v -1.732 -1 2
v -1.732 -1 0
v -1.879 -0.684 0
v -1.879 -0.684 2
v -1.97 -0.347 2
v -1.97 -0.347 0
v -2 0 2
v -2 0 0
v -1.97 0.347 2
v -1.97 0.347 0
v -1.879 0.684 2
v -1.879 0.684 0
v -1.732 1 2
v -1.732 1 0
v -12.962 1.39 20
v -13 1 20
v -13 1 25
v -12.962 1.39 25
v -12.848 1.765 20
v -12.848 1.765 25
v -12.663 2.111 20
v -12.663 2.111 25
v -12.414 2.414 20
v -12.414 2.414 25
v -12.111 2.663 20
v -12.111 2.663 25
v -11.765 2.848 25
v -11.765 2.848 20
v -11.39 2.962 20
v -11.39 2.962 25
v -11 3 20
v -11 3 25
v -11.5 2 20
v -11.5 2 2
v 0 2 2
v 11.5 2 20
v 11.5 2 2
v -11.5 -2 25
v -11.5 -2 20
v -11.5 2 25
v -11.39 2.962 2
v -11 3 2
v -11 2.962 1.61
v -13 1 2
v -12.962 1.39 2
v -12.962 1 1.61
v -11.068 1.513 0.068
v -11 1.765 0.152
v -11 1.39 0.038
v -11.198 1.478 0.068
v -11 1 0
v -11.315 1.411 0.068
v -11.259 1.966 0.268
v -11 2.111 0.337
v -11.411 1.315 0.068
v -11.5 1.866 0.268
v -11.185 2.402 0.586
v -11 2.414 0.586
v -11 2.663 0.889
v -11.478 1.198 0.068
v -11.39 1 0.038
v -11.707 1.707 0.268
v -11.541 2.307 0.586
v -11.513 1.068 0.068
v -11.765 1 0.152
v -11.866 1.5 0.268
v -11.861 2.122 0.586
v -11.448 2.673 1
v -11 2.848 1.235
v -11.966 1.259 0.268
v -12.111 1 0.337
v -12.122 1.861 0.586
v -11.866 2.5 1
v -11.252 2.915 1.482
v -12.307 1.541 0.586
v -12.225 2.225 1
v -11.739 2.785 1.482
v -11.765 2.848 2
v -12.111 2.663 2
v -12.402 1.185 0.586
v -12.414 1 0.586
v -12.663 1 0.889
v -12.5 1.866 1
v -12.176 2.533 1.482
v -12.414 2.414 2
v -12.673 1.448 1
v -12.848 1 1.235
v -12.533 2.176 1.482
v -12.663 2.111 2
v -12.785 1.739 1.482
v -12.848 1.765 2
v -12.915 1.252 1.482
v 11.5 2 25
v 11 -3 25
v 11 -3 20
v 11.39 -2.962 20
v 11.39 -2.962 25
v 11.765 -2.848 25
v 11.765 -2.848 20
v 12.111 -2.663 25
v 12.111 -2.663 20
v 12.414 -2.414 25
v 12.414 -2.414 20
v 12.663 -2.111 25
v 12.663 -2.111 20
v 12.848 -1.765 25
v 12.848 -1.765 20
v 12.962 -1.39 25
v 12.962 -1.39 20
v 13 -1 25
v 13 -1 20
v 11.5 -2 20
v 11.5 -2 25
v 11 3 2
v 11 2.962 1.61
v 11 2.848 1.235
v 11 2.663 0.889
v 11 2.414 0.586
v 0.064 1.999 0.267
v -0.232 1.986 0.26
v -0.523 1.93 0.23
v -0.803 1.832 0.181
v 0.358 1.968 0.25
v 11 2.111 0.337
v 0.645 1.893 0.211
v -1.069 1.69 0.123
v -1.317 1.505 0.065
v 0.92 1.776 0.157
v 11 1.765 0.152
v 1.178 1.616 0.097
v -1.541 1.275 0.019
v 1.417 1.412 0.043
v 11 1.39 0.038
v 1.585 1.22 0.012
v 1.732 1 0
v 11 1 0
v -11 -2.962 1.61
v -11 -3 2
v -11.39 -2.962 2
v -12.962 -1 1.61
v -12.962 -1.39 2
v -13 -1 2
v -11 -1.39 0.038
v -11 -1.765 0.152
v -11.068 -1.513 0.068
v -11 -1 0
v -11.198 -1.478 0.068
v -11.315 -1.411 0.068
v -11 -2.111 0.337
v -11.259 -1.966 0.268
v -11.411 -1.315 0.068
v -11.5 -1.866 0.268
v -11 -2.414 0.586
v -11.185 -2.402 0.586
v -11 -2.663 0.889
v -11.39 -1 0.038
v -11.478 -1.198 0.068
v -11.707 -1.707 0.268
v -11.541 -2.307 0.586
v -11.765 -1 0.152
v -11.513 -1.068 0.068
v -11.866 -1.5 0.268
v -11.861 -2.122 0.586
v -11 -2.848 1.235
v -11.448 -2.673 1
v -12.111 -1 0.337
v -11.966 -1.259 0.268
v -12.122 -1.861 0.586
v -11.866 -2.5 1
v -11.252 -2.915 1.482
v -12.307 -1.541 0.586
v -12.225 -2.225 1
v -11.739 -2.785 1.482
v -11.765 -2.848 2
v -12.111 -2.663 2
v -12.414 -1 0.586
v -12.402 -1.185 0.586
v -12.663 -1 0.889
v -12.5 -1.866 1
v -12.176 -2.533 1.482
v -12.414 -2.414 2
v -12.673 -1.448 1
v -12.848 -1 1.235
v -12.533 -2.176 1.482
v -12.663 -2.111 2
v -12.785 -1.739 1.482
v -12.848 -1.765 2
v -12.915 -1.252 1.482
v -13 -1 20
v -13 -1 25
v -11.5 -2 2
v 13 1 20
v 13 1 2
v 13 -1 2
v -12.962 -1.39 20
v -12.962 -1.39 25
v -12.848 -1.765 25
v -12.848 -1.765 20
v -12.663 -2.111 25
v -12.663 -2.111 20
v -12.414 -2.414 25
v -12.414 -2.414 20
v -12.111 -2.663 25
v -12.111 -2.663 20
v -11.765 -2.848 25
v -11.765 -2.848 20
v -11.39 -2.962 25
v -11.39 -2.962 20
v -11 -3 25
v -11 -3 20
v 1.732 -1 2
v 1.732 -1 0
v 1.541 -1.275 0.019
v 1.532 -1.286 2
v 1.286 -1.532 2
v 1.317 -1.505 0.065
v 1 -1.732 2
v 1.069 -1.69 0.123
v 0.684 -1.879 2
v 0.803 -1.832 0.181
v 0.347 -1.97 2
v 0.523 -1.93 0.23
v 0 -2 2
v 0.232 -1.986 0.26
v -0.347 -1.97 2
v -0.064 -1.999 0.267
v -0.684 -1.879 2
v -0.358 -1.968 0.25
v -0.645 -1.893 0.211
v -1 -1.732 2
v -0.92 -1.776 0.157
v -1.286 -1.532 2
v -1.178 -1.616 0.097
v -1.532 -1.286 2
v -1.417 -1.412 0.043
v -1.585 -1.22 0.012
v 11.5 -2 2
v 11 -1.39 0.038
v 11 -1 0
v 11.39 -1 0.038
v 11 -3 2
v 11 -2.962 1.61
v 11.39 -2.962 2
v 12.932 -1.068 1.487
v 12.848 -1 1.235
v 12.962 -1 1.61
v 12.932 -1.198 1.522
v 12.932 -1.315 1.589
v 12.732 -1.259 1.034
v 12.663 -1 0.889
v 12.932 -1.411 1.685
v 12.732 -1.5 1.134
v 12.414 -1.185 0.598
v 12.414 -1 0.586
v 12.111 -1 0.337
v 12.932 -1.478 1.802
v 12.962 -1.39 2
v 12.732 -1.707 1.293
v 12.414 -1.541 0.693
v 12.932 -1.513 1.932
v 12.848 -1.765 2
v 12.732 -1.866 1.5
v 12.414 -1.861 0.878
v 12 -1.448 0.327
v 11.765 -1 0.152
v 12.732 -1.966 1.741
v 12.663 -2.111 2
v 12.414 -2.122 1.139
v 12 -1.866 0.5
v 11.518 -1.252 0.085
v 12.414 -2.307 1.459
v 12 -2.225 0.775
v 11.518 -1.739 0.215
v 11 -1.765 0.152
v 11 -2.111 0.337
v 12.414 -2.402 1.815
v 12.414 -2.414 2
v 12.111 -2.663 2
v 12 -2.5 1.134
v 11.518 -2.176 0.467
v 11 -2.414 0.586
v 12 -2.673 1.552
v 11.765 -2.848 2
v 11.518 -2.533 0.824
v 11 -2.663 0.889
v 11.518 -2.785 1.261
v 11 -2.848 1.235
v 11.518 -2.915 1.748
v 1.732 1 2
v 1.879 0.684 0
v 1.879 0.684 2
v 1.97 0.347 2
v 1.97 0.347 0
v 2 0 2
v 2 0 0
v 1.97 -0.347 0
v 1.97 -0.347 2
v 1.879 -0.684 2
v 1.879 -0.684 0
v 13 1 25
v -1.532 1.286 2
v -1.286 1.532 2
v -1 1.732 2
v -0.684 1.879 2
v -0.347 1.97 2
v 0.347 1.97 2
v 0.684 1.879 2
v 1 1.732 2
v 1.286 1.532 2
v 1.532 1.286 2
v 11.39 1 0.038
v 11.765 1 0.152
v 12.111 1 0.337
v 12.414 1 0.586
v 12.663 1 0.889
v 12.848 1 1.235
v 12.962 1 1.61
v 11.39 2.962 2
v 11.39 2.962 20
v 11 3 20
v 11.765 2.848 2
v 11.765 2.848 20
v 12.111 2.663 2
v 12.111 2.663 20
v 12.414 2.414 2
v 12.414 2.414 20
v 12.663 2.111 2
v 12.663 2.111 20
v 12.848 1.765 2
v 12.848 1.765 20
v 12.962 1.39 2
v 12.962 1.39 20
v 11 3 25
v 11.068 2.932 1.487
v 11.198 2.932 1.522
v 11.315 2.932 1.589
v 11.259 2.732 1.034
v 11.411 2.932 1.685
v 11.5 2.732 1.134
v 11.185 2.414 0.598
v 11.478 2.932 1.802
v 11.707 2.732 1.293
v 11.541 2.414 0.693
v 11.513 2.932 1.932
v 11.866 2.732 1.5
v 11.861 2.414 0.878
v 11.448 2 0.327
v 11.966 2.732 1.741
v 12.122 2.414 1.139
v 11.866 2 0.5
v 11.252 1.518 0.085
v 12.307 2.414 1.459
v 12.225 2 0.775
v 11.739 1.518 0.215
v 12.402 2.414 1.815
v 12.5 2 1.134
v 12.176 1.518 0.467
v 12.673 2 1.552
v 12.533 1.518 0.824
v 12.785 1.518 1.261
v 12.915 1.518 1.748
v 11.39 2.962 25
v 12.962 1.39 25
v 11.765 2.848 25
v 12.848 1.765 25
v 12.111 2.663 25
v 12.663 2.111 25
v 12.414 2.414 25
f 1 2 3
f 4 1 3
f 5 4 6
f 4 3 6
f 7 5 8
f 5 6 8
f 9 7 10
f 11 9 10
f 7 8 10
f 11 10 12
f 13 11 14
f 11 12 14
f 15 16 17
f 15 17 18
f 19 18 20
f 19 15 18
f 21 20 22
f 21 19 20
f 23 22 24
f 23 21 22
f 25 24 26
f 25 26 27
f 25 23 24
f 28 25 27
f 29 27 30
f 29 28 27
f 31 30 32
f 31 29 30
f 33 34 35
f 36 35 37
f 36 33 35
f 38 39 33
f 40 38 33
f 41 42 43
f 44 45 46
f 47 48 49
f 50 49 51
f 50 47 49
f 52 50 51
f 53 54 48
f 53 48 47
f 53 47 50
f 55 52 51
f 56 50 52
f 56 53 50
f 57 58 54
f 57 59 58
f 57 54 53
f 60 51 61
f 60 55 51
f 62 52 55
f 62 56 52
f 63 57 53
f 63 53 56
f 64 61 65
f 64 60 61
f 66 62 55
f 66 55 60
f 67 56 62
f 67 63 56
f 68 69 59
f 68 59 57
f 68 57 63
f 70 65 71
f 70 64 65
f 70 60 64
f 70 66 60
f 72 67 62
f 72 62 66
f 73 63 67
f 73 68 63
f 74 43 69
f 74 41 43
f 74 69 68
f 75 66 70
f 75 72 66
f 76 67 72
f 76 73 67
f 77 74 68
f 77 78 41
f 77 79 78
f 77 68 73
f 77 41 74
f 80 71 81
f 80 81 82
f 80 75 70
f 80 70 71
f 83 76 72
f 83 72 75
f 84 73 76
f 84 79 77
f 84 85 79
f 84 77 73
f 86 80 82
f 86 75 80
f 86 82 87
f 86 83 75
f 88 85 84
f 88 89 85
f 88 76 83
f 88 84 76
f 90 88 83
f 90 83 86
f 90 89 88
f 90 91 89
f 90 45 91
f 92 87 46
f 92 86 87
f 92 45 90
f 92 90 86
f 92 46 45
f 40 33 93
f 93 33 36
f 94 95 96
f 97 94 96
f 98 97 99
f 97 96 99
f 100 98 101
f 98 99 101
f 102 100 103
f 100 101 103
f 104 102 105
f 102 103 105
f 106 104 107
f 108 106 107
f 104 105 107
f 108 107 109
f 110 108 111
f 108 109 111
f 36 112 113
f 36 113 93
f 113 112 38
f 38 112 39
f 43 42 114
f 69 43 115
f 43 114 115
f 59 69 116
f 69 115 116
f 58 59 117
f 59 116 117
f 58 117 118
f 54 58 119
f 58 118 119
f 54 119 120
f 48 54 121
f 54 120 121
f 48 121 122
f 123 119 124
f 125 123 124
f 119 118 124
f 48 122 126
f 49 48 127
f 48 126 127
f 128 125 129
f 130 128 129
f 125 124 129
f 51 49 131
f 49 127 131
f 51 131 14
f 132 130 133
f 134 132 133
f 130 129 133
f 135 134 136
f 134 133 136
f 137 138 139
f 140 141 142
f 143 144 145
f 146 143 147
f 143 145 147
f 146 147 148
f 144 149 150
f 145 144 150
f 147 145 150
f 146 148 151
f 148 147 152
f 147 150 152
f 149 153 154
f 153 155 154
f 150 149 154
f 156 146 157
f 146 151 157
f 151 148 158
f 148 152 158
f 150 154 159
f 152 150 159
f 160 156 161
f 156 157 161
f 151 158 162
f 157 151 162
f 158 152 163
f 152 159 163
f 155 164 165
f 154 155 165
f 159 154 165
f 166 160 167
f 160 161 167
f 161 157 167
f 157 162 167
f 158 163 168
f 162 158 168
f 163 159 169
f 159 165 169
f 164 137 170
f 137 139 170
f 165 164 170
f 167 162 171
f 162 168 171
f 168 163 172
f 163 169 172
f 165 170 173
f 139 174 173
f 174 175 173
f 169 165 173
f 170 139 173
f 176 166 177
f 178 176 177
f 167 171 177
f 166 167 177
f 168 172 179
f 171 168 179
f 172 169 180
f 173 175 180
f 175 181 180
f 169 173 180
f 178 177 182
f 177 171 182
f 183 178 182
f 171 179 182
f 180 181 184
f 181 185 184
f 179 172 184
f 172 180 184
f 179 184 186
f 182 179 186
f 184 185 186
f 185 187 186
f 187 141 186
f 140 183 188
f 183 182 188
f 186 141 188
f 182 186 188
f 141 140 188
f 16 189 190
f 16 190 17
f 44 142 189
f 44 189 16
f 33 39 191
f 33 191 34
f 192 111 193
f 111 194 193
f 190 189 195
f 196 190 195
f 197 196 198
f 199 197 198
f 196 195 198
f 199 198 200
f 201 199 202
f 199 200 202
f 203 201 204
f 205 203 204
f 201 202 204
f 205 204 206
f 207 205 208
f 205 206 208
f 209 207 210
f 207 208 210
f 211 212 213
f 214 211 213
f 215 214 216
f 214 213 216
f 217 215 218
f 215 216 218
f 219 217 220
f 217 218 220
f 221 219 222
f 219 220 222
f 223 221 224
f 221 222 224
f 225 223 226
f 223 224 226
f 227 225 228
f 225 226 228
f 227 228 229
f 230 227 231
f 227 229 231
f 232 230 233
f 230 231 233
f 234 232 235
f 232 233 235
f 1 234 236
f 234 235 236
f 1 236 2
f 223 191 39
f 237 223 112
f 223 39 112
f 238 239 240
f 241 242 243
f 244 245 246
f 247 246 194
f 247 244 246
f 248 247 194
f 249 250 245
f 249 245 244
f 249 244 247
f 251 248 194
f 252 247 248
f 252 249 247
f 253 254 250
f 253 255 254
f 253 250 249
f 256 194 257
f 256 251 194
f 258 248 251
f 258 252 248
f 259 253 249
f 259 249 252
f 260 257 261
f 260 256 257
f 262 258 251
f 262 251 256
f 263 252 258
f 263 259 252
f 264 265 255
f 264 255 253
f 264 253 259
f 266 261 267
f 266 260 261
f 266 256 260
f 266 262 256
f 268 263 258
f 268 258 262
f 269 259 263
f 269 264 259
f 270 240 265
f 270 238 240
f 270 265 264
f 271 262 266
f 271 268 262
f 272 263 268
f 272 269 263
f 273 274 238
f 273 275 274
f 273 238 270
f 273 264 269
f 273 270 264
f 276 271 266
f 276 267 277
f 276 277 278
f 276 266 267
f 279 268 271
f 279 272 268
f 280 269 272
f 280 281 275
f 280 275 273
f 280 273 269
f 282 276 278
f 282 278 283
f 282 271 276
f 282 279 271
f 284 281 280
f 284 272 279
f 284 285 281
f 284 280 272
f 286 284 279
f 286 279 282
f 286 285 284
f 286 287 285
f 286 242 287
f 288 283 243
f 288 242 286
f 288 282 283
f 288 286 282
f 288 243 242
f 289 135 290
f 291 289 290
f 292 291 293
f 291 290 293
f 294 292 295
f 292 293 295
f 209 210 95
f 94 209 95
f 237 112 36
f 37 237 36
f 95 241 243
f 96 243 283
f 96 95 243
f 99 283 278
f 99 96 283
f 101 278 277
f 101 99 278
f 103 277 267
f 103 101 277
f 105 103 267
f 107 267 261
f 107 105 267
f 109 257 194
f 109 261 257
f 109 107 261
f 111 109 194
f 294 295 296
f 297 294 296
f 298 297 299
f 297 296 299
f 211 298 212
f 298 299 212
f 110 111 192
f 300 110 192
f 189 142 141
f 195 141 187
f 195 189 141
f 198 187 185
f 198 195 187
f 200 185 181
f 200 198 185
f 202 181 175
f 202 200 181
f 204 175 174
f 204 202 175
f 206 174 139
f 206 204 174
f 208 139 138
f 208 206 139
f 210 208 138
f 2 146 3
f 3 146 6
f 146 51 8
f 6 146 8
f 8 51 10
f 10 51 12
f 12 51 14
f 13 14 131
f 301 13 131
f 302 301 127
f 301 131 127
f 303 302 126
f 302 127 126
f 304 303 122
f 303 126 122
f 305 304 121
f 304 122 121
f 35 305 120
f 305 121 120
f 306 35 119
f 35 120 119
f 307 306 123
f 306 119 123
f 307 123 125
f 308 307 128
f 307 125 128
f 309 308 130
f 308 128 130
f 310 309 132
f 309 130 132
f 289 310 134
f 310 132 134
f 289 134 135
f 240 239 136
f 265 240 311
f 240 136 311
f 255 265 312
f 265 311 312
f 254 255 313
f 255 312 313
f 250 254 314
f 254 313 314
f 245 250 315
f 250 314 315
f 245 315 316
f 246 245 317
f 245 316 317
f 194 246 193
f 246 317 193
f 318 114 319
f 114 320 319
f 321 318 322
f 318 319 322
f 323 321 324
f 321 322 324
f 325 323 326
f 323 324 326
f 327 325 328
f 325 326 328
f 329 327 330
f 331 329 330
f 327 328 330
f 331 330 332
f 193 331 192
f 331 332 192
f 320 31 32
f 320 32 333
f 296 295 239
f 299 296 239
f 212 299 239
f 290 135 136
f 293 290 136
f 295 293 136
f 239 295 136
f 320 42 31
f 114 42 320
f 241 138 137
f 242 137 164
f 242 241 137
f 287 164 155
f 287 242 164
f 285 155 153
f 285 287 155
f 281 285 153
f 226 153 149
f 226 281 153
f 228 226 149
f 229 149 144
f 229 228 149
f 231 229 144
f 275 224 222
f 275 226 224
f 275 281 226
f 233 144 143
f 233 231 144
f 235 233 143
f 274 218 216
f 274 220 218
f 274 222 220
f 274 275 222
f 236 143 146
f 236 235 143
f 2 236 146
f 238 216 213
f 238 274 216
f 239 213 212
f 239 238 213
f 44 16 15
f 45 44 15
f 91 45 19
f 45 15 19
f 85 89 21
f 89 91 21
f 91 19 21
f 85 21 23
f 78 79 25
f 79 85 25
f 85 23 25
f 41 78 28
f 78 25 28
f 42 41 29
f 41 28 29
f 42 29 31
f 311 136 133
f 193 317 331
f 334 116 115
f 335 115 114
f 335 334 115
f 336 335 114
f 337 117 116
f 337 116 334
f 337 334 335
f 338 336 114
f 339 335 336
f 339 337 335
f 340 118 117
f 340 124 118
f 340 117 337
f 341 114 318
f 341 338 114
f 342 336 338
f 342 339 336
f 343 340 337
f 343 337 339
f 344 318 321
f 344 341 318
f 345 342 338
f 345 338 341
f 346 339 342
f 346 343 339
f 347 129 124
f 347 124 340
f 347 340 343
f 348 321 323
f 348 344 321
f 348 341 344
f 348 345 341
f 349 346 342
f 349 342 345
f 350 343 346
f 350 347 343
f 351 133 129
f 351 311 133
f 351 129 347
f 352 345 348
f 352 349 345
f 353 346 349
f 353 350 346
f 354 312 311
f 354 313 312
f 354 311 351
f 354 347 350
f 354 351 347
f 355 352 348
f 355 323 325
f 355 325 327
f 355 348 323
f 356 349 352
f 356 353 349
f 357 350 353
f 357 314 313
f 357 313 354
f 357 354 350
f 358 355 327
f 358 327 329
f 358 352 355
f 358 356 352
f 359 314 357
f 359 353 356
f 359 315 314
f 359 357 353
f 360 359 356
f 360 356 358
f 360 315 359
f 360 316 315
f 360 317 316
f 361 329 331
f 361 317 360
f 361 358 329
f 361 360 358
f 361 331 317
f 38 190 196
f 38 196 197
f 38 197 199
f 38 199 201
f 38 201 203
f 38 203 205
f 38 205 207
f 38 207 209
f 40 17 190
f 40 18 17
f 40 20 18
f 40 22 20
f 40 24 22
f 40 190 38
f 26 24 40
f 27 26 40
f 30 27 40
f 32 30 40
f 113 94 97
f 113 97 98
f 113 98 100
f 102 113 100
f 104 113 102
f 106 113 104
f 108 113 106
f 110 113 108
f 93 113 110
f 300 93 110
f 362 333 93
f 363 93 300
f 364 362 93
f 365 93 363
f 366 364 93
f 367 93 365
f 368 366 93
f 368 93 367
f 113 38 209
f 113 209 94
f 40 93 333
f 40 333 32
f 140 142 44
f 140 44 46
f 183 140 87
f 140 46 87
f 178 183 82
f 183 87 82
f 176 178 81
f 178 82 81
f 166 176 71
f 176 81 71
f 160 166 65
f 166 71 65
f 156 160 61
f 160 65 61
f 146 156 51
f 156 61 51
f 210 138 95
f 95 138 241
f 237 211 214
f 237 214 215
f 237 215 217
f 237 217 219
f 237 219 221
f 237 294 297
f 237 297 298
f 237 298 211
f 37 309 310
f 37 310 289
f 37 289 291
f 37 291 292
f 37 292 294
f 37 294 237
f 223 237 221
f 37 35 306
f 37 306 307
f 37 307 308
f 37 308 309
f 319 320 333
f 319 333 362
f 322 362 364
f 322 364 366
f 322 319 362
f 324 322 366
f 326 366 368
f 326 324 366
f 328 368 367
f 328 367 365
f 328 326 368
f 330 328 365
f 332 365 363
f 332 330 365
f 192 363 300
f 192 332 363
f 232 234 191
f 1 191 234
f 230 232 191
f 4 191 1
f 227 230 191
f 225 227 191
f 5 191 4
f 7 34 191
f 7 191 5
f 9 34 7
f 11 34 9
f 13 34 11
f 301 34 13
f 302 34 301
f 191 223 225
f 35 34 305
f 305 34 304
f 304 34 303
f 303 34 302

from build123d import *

# Parameters (mm, degrees)
F0_W     = 26
F0_H     = 6
F1_DEPTH = 20
F2_W     = 23
F2_H     = 4
F3_DEPTH = 18
F4_R     = 2
F6_DEPTH = 25
F7_DEPTH = 5


with BuildPart() as f1:
    # F0 (on Top) → F1 (new body)
    with BuildSketch(Plane.XY):
        Rectangle(F0_W, F0_H)
    extrude(amount=F1_DEPTH)

    # F2 (on face) → F3 (cut)
    with BuildSketch(Plane.XY.offset(20)):
        Rectangle(F2_W, F2_H)
    extrude(amount=-F3_DEPTH, mode=Mode.SUBTRACT)

    # F4
    f4_edges = [f1.edges().sort_by_distance(p)[0] for p in [
        (-13, 3, 10),
        (-13, -3, 10),
        (0, -3, 0),
        (13, 0, 0),
        (0, 3, 0),
        (-13, 0, 0),
        (13, -3, 10),
        (13, 3, 10),
    ]]
    fillet(f4_edges, radius=F4_R)

    # F5 (on face) → F6 (cut)
    with BuildSketch(Plane(origin=(0, 0, 0), x_dir=(1, 0, 0), z_dir=(0, 0, -1))):
        with BuildLine():
            Line((-1.7320508076, 1), (1.7320508076, 1))
            ThreePointArc((1.7320508076, 1), (0, 2), (-1.7320508076, 1))
        make_face()
        with BuildLine():
            ThreePointArc((-1.7320508076, -1), (0, -2), (1.7320508076, -1))
            Line((1.7320508076, -1), (-1.7320508076, -1))
        make_face()
        with BuildLine():
            ThreePointArc((1.7320508076, -1), (1.9318516526, -0.5176380902), (2, 0))
            ThreePointArc((2, 0), (1.9318516526, 0.5176380902), (1.7320508076, 1))
            Line((1.7320508076, 1), (-1.7320508076, 1))
            ThreePointArc((-1.7320508076, 1), (-2, 0), (-1.7320508076, -1))
            Line((-1.7320508076, -1), (1.7320508076, -1))
        make_face()
    extrude(amount=-F6_DEPTH, mode=Mode.SUBTRACT)

    # F7 (add): a face of the model
    f7_faces = [f1.faces().sort_by_distance(p)[0] for p in [
        (0, -2.7331667187, 20),
    ]]
    extrude(f7_faces, amount=F7_DEPTH)


solid = f1.part
